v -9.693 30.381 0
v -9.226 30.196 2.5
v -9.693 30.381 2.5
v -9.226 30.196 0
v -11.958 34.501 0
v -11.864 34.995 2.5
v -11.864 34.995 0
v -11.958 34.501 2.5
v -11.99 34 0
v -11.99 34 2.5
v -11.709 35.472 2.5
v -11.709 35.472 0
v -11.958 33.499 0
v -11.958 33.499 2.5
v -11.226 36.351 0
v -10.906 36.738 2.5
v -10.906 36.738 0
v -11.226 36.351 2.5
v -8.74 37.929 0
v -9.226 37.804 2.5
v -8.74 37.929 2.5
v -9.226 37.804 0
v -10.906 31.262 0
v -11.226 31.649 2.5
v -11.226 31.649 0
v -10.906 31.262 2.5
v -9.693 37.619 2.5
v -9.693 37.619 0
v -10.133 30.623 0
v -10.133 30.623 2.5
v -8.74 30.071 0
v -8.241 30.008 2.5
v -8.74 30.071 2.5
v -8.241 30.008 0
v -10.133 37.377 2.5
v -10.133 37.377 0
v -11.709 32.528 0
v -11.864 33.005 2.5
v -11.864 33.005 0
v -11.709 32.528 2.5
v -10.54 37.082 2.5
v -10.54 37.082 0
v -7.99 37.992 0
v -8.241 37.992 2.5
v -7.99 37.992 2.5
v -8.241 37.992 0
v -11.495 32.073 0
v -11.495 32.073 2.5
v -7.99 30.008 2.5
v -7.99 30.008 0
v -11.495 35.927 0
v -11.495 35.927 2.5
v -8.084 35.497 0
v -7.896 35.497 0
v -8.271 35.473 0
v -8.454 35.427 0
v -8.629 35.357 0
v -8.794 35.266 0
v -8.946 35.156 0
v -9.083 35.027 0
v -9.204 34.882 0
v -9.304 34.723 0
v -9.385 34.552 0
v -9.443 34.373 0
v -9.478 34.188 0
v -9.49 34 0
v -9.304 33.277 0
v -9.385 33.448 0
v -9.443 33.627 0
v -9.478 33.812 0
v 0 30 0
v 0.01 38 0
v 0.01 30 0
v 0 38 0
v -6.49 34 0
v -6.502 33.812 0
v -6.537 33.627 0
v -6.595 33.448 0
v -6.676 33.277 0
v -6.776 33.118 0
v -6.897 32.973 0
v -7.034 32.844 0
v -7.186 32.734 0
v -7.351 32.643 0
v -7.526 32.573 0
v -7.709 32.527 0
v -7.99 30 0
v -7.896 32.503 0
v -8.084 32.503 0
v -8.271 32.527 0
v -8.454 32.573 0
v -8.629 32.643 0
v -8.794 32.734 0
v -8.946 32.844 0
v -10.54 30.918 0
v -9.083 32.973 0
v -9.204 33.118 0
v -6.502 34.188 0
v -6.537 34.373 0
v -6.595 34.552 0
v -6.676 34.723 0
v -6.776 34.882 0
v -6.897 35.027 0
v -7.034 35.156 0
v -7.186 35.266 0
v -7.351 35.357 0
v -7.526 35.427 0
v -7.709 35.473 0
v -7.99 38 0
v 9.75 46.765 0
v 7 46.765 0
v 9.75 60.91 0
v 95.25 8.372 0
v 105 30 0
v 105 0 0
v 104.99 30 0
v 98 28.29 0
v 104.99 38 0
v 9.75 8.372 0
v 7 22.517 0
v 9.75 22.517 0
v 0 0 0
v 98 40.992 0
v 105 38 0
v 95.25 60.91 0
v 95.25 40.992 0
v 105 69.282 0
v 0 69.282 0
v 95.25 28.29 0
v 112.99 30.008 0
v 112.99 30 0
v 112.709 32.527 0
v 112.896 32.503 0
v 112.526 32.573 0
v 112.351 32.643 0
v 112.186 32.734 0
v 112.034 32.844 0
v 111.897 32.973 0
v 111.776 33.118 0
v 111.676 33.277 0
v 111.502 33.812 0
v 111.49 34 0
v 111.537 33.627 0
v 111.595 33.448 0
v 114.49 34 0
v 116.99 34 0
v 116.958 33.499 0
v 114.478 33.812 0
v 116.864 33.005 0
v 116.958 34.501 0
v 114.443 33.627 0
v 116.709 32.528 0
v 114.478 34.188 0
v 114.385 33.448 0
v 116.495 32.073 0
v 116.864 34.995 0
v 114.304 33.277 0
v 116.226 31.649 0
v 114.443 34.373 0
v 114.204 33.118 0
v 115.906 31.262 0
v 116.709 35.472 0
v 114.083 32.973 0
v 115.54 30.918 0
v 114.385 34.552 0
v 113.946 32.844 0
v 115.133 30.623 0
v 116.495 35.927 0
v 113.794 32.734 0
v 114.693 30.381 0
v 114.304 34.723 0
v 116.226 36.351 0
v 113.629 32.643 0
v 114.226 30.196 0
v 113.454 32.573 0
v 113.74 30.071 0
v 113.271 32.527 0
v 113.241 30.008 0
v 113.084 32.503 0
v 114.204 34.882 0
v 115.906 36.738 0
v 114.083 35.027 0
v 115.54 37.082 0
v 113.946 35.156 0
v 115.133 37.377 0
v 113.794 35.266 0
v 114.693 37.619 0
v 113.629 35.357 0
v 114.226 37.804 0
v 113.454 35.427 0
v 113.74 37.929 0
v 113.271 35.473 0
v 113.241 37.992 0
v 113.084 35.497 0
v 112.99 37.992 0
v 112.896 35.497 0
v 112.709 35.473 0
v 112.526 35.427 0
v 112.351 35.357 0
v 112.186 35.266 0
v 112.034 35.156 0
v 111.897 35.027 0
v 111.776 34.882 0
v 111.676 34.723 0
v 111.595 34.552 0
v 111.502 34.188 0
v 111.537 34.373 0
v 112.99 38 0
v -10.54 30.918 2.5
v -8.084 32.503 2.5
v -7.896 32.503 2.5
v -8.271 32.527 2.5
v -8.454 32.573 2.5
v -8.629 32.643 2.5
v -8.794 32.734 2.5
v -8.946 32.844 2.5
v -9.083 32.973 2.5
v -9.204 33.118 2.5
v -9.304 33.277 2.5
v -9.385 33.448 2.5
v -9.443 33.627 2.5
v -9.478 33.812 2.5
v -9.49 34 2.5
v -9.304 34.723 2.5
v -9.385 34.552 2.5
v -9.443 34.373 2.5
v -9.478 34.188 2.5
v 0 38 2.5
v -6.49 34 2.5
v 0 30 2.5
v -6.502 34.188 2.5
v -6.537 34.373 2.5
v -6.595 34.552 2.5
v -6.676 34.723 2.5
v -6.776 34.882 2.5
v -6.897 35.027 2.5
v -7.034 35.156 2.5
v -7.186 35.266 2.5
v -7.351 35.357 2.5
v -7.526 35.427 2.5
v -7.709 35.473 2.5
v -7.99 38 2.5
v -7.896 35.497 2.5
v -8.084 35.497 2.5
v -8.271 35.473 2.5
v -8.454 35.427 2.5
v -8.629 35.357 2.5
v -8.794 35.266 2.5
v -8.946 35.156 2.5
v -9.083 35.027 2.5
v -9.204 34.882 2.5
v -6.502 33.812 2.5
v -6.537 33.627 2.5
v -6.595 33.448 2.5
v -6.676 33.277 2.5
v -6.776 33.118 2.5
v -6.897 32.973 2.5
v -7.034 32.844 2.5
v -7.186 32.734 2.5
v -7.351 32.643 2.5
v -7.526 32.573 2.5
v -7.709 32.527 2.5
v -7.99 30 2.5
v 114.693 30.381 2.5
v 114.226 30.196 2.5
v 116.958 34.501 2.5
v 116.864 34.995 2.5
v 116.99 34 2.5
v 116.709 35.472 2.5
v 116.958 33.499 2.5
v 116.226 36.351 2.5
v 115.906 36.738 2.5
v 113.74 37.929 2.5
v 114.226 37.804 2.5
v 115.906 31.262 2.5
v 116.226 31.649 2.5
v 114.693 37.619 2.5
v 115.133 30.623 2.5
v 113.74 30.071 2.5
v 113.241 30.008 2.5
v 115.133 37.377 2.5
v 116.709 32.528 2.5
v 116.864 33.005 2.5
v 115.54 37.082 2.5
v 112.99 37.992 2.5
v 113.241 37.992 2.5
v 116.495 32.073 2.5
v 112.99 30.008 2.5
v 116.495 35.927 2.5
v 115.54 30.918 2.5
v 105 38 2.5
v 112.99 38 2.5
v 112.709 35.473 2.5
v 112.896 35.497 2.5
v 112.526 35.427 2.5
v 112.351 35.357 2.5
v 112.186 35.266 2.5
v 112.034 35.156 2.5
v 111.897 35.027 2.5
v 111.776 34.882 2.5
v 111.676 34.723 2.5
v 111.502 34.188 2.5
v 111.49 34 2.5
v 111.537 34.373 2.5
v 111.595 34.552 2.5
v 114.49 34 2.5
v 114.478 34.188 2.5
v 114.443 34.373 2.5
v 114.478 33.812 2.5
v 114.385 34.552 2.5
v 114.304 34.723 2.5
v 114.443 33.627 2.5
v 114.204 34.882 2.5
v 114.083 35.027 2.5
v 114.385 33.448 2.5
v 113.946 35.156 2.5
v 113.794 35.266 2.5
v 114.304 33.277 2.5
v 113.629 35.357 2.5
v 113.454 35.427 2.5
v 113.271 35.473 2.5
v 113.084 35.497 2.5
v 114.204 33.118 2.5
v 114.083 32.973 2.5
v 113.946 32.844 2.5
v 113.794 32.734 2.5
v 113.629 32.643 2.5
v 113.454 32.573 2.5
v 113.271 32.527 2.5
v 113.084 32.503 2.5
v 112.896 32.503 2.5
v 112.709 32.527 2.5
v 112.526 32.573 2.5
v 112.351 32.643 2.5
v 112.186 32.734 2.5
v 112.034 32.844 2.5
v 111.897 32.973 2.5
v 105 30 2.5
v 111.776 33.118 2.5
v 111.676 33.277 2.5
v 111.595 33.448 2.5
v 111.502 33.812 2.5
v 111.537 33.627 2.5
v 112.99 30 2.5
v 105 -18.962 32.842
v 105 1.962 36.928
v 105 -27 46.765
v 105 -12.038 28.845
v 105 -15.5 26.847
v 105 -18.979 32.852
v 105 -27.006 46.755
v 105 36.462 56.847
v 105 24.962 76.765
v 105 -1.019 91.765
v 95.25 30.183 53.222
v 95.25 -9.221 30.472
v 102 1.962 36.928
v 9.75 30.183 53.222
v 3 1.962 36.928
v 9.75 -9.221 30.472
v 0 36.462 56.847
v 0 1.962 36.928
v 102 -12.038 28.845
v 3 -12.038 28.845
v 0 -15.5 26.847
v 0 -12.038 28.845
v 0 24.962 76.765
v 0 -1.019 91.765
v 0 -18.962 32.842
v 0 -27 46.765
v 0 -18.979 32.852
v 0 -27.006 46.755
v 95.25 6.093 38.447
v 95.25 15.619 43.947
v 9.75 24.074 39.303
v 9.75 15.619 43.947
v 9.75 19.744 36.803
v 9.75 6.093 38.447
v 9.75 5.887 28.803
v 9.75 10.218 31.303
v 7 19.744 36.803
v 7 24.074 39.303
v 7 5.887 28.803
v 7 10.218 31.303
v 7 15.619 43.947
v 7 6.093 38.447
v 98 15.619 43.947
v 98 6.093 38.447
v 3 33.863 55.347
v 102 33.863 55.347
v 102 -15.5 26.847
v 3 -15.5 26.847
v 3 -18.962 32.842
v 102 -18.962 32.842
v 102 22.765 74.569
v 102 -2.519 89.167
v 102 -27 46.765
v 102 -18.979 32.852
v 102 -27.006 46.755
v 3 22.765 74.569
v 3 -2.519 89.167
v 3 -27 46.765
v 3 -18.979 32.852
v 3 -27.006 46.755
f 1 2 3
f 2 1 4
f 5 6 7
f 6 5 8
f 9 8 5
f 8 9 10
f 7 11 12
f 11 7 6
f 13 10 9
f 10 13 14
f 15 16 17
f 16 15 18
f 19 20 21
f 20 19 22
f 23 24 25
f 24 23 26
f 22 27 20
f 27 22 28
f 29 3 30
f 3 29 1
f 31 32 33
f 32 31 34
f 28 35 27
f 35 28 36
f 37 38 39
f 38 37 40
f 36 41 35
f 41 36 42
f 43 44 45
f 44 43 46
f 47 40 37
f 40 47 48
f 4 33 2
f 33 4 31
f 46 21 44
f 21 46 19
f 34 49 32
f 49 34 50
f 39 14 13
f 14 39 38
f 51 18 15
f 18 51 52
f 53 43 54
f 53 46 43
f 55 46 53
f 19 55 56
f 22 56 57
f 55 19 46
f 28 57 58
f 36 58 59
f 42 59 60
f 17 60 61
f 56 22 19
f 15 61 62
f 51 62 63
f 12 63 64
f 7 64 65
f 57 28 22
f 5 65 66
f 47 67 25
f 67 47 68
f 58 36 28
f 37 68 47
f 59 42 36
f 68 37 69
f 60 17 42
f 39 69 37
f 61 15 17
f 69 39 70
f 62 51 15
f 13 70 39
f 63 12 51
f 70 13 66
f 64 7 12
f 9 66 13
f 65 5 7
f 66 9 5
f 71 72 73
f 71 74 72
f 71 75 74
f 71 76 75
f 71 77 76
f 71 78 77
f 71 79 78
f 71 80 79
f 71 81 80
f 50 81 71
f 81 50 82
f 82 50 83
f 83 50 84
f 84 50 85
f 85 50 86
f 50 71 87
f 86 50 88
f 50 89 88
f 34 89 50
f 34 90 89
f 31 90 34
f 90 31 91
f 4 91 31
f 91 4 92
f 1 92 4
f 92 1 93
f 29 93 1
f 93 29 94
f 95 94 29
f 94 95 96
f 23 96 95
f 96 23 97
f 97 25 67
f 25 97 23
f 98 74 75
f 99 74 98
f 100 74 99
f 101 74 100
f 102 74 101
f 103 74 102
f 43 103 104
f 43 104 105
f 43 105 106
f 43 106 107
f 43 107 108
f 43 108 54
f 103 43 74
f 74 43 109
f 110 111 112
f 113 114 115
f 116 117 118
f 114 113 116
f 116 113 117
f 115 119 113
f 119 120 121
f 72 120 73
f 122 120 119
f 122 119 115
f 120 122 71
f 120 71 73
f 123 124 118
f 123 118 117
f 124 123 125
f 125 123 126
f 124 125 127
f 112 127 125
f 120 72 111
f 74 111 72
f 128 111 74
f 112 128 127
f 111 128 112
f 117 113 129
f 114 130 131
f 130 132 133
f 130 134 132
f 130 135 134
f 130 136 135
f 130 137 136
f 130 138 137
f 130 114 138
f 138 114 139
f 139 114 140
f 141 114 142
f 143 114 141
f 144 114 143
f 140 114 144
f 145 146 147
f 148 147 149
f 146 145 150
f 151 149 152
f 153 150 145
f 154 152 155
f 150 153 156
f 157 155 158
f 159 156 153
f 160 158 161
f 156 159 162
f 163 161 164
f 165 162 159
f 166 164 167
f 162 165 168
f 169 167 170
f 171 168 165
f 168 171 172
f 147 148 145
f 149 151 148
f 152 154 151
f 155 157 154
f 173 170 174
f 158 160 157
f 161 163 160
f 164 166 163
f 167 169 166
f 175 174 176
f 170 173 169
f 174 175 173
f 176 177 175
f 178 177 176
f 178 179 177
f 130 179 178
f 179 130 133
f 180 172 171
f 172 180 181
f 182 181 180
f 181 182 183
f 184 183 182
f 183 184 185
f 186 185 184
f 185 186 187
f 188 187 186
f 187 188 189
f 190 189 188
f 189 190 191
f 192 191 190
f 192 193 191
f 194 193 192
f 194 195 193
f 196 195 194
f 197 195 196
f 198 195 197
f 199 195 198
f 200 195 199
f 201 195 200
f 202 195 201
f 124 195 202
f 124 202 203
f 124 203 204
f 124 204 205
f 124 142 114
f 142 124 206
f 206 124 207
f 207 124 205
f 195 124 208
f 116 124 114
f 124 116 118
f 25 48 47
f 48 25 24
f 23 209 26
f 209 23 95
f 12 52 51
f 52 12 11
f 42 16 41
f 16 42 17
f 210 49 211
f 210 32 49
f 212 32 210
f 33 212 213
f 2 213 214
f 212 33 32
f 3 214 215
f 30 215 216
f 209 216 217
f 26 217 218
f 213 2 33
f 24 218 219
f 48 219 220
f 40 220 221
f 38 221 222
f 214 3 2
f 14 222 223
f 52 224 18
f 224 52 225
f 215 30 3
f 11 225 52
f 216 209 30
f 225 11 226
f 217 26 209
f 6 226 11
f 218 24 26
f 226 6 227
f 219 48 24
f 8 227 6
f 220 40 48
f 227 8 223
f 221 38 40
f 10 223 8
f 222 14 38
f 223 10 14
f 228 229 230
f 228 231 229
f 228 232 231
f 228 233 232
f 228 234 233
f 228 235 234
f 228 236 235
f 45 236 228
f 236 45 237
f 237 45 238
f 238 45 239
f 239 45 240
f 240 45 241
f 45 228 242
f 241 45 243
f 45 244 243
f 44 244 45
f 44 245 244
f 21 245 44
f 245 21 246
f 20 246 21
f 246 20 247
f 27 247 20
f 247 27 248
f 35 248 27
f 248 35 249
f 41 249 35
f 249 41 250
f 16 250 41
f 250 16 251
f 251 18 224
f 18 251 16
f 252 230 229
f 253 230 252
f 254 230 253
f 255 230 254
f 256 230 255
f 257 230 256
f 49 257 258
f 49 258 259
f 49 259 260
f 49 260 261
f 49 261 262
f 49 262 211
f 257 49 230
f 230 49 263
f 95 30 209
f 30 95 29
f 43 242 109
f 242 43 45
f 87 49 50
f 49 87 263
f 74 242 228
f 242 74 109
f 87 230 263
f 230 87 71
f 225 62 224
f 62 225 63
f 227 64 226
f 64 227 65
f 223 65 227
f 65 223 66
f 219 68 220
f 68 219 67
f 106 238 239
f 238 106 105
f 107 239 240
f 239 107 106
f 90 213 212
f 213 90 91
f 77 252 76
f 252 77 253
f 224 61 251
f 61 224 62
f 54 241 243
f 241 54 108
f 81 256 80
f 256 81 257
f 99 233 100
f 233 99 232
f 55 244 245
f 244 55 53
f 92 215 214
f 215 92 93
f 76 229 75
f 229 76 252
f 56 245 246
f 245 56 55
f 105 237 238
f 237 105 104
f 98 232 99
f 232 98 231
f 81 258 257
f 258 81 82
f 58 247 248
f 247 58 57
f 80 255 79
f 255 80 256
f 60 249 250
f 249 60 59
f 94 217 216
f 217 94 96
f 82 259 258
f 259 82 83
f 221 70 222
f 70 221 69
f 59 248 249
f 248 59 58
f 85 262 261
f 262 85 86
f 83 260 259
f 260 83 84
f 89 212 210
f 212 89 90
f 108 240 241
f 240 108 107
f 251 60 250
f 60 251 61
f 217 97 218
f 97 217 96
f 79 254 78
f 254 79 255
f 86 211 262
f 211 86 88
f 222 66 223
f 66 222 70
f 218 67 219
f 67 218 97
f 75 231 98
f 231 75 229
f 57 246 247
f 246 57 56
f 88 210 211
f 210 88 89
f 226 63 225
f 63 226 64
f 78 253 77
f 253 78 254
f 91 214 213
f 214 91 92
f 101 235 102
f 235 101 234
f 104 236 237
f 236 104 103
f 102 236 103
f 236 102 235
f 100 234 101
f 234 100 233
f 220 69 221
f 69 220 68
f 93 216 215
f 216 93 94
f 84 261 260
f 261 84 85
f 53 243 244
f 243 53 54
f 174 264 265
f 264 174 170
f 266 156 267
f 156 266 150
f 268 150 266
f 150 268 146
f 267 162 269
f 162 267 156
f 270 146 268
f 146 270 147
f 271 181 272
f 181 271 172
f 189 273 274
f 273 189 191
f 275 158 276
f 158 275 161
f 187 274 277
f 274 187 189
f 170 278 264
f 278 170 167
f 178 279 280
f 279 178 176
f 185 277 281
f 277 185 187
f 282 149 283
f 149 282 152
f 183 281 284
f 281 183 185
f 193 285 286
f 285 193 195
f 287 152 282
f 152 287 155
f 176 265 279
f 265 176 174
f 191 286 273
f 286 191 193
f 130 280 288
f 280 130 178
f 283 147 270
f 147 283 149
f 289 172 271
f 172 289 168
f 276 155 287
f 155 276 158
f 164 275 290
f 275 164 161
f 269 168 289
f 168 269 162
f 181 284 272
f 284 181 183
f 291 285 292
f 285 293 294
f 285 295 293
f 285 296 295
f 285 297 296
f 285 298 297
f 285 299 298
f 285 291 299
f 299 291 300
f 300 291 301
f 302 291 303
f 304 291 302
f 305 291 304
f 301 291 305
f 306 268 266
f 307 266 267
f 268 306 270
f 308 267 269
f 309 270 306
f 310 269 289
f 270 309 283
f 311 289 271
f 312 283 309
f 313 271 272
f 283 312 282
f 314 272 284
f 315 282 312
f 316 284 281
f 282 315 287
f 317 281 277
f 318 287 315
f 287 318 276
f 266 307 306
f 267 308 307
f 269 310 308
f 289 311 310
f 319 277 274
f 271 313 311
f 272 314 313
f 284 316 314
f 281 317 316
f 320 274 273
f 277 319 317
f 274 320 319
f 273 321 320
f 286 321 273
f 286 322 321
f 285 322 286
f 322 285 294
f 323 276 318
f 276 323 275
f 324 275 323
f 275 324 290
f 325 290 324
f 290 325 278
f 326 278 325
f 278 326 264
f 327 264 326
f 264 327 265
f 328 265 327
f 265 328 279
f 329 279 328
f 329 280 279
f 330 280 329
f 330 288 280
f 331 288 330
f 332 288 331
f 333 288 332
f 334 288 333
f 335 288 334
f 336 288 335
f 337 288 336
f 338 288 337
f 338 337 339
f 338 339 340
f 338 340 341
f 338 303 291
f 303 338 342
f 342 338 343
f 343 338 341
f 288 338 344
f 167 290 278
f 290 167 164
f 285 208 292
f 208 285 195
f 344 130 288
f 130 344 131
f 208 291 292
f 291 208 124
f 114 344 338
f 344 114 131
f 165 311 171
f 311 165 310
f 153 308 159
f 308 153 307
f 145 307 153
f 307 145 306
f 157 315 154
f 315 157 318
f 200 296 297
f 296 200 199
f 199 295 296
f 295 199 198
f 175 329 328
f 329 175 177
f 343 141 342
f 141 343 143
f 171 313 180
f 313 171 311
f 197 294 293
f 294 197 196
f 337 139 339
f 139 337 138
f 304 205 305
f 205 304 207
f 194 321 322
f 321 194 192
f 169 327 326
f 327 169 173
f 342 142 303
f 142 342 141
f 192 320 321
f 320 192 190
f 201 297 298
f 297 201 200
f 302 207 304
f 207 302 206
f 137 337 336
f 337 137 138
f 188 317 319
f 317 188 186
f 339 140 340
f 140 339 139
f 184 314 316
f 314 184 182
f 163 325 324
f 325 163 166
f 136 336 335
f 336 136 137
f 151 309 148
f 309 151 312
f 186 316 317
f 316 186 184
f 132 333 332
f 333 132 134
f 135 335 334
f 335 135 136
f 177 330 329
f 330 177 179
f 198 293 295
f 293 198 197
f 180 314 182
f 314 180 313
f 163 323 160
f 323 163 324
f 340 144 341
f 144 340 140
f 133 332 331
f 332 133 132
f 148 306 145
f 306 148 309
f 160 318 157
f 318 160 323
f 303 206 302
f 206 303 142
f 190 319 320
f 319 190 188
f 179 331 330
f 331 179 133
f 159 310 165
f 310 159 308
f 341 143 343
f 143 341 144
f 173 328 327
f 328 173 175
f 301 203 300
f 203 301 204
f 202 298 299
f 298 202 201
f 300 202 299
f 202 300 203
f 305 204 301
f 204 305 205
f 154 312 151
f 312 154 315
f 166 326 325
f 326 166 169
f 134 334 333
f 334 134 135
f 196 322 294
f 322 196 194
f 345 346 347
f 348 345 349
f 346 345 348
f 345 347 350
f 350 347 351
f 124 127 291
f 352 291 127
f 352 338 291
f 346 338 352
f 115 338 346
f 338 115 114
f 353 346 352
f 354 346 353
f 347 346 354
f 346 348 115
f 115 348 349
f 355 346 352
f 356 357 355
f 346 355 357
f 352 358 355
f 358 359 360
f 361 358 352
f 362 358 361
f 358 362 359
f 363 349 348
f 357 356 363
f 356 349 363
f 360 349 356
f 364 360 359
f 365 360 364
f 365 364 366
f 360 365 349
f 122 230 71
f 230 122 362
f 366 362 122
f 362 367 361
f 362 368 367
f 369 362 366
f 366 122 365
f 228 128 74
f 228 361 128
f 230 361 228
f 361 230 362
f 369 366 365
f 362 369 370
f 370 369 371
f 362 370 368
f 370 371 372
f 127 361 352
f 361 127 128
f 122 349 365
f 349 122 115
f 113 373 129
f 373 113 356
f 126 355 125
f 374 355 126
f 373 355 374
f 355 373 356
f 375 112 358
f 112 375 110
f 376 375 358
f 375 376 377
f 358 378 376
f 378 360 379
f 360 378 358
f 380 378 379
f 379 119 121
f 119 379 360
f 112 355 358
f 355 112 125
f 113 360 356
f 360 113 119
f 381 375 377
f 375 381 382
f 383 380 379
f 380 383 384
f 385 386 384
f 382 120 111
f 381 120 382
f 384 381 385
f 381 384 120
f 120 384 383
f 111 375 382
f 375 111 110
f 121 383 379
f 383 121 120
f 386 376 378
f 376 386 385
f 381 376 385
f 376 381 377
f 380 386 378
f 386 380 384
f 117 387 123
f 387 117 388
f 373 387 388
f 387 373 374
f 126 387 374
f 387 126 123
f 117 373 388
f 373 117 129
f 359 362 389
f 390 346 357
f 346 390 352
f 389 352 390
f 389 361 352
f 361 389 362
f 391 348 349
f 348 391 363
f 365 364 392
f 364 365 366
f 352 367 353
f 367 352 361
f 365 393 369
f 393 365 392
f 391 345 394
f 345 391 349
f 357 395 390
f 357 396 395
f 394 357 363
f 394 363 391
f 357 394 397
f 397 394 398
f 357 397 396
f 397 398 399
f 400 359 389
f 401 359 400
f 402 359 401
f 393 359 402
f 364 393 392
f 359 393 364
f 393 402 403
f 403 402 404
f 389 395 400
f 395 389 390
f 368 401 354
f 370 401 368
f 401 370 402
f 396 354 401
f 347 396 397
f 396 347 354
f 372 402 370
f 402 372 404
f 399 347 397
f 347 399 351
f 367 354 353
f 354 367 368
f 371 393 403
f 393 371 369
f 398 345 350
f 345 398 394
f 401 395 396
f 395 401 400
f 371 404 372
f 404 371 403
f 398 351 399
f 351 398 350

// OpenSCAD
bezelInsertionWidth=85;
bezelInsertionHeight=45;
bezelInsertionDepth=23;

insertionTolerance=0.25;

bezelFaceWidth=105;
bezelFaceHeight=60;

clipDetentWidth=3; // depth of detent cutout
clipDetentHeight=11;
clipDetentInsetFromFace=0.75;

wireTunnelWidth=3;
wireTunnelHeight=21;
wireTunnelInsetFromRear=14;

baseAngle=30;
hoodAngle=30;

hoodDepth=30; // mm out on the top side.
hoodThickness=3;

// riser leaves room to maneuver the part in from the front
// and makes viewing easier.
hoodRiserDepth=bezelInsertionDepth;

rearClearance=8;

overlap=0.01;

// Calculated
bezelFaceSideWidth=(bezelFaceWidth-bezelInsertionWidth)/2;
bezelFaceTopHeight=(bezelFaceHeight-bezelInsertionHeight)/2;


baseExtraDepthForAngle=bezelFaceHeight*tan(baseAngle);
bottomCutHeight=bezelFaceHeight*2;

// full front-back dimension+ (room for screwdriver release)
clipDetentDepth=bezelInsertionDepth+rearClearance+baseExtraDepthForAngle;

attachmentTabWidth=8;
$fn=50;


union() {

    // Note: approximate front/back center for tabs approximated
    // by _not_ subtracting the tab width.  Bottom is angle cut so it is longer
    // than the actual bezelFaceHeight.
    // left attachment tab
    translate([overlap,bezelFaceHeight/2,0])
        mirror([1,0,0]) attachmentTab(attachmentTabWidth);

    // right attachment tab
    translate([bezelFaceWidth-overlap,bezelFaceHeight/2,0])
        attachmentTab(attachmentTabWidth);


    difference() {
        rotate([baseAngle,0,0])
            translate([0,0,-baseExtraDepthForAngle]) {
                union() {
                    // base
                    difference() {
                        cube([bezelFaceWidth,bezelFaceHeight,bezelInsertionDepth+rearClearance
                            +baseExtraDepthForAngle]);
                        // insertion cutout
                        translate([bezelFaceSideWidth-insertionTolerance,
                                bezelFaceTopHeight-insertionTolerance,-overlap])
                            cube([bezelInsertionWidth+insertionTolerance*2,
                                    bezelInsertionHeight+insertionTolerance*2,
                                bezelInsertionDepth+rearClearance
                                +baseExtraDepthForAngle+overlap*2]);
                        // wire tunnel
                        translate([bezelFaceSideWidth-wireTunnelWidth,
                                (bezelFaceHeight-wireTunnelHeight)/2,
                                -overlap])
                            cube([wireTunnelWidth+overlap,wireTunnelHeight,
                                wireTunnelInsetFromRear+rearClearance+baseExtraDepthForAngle
                                +overlap]);
                        // left detent
                        translate([bezelFaceSideWidth-clipDetentWidth,
                                (bezelFaceHeight-clipDetentHeight)/2,
                                bezelInsertionDepth+rearClearance+baseExtraDepthForAngle
                                    -clipDetentDepth-clipDetentInsetFromFace])
                            cube([clipDetentWidth+overlap,clipDetentHeight,
                                clipDetentDepth]);
                        // right detent
                        translate([bezelFaceWidth-bezelFaceSideWidth-overlap,
                                (bezelFaceHeight-clipDetentHeight)/2,
                                bezelInsertionDepth+rearClearance+baseExtraDepthForAngle
                                    -clipDetentDepth-clipDetentInsetFromFace])
                            cube([clipDetentWidth+overlap,clipDetentHeight,
                                clipDetentDepth]);
                        
                    }
                    // Riser for hood
                    translate([0,0,bezelInsertionDepth+rearClearance+baseExtraDepthForAngle])
                        difference() {
                            cube([bezelFaceWidth,bezelFaceHeight,hoodRiserDepth]);
                            translate([hoodThickness,-overlap,-overlap])
                                cube([bezelFaceWidth-hoodThickness*2,
                                    bezelFaceHeight-hoodThickness+overlap,
                                    hoodDepth+overlap*2]);
                        }
                    
                    // hood
                    translate([0,0,
                            bezelInsertionDepth+rearClearance+baseExtraDepthForAngle
                                +hoodRiserDepth])
                        difference() {
                            // move, rotate, move back
                            translate([0,bezelFaceHeight,0]) rotate([hoodAngle,0,0]) 
                                    translate([0,-bezelFaceHeight,0])
                                difference() {
                                    cube([bezelFaceWidth,bezelFaceHeight,hoodDepth]);
                                    translate([hoodThickness,-overlap,-overlap])
                                        cube([bezelFaceWidth-hoodThickness*2,
                                            bezelFaceHeight-hoodThickness+overlap,
                                            hoodDepth+overlap*2]);
                                }
                                // cut off front corner of hood
                                translate([-overlap,-bezelFaceHeight-overlap,-hoodDepth])
                                    cube([bezelFaceWidth+overlap*2,bezelFaceHeight,hoodDepth*2]);
                        }
                }
            }
        translate([-overlap,-overlap,-baseExtraDepthForAngle])
            cube([bezelFaceWidth+overlap*2,bottomCutHeight+overlap*2,baseExtraDepthForAngle]);
    }
}

module attachmentTab(attachmentTabWidth) {
    attachmentTabThickness=2.5;
    attachmentTabHoleDia=3;
    difference() {
        union() {
            translate([attachmentTabWidth,attachmentTabWidth/2,0])
                cylinder(d=attachmentTabWidth,h=attachmentTabThickness);
            cube([attachmentTabWidth,attachmentTabWidth,attachmentTabThickness]);
        }
        translate([attachmentTabWidth,attachmentTabWidth/2,-overlap])
            cylinder(d=attachmentTabHoleDia,h=attachmentTabThickness+overlap*2);
    }
}
